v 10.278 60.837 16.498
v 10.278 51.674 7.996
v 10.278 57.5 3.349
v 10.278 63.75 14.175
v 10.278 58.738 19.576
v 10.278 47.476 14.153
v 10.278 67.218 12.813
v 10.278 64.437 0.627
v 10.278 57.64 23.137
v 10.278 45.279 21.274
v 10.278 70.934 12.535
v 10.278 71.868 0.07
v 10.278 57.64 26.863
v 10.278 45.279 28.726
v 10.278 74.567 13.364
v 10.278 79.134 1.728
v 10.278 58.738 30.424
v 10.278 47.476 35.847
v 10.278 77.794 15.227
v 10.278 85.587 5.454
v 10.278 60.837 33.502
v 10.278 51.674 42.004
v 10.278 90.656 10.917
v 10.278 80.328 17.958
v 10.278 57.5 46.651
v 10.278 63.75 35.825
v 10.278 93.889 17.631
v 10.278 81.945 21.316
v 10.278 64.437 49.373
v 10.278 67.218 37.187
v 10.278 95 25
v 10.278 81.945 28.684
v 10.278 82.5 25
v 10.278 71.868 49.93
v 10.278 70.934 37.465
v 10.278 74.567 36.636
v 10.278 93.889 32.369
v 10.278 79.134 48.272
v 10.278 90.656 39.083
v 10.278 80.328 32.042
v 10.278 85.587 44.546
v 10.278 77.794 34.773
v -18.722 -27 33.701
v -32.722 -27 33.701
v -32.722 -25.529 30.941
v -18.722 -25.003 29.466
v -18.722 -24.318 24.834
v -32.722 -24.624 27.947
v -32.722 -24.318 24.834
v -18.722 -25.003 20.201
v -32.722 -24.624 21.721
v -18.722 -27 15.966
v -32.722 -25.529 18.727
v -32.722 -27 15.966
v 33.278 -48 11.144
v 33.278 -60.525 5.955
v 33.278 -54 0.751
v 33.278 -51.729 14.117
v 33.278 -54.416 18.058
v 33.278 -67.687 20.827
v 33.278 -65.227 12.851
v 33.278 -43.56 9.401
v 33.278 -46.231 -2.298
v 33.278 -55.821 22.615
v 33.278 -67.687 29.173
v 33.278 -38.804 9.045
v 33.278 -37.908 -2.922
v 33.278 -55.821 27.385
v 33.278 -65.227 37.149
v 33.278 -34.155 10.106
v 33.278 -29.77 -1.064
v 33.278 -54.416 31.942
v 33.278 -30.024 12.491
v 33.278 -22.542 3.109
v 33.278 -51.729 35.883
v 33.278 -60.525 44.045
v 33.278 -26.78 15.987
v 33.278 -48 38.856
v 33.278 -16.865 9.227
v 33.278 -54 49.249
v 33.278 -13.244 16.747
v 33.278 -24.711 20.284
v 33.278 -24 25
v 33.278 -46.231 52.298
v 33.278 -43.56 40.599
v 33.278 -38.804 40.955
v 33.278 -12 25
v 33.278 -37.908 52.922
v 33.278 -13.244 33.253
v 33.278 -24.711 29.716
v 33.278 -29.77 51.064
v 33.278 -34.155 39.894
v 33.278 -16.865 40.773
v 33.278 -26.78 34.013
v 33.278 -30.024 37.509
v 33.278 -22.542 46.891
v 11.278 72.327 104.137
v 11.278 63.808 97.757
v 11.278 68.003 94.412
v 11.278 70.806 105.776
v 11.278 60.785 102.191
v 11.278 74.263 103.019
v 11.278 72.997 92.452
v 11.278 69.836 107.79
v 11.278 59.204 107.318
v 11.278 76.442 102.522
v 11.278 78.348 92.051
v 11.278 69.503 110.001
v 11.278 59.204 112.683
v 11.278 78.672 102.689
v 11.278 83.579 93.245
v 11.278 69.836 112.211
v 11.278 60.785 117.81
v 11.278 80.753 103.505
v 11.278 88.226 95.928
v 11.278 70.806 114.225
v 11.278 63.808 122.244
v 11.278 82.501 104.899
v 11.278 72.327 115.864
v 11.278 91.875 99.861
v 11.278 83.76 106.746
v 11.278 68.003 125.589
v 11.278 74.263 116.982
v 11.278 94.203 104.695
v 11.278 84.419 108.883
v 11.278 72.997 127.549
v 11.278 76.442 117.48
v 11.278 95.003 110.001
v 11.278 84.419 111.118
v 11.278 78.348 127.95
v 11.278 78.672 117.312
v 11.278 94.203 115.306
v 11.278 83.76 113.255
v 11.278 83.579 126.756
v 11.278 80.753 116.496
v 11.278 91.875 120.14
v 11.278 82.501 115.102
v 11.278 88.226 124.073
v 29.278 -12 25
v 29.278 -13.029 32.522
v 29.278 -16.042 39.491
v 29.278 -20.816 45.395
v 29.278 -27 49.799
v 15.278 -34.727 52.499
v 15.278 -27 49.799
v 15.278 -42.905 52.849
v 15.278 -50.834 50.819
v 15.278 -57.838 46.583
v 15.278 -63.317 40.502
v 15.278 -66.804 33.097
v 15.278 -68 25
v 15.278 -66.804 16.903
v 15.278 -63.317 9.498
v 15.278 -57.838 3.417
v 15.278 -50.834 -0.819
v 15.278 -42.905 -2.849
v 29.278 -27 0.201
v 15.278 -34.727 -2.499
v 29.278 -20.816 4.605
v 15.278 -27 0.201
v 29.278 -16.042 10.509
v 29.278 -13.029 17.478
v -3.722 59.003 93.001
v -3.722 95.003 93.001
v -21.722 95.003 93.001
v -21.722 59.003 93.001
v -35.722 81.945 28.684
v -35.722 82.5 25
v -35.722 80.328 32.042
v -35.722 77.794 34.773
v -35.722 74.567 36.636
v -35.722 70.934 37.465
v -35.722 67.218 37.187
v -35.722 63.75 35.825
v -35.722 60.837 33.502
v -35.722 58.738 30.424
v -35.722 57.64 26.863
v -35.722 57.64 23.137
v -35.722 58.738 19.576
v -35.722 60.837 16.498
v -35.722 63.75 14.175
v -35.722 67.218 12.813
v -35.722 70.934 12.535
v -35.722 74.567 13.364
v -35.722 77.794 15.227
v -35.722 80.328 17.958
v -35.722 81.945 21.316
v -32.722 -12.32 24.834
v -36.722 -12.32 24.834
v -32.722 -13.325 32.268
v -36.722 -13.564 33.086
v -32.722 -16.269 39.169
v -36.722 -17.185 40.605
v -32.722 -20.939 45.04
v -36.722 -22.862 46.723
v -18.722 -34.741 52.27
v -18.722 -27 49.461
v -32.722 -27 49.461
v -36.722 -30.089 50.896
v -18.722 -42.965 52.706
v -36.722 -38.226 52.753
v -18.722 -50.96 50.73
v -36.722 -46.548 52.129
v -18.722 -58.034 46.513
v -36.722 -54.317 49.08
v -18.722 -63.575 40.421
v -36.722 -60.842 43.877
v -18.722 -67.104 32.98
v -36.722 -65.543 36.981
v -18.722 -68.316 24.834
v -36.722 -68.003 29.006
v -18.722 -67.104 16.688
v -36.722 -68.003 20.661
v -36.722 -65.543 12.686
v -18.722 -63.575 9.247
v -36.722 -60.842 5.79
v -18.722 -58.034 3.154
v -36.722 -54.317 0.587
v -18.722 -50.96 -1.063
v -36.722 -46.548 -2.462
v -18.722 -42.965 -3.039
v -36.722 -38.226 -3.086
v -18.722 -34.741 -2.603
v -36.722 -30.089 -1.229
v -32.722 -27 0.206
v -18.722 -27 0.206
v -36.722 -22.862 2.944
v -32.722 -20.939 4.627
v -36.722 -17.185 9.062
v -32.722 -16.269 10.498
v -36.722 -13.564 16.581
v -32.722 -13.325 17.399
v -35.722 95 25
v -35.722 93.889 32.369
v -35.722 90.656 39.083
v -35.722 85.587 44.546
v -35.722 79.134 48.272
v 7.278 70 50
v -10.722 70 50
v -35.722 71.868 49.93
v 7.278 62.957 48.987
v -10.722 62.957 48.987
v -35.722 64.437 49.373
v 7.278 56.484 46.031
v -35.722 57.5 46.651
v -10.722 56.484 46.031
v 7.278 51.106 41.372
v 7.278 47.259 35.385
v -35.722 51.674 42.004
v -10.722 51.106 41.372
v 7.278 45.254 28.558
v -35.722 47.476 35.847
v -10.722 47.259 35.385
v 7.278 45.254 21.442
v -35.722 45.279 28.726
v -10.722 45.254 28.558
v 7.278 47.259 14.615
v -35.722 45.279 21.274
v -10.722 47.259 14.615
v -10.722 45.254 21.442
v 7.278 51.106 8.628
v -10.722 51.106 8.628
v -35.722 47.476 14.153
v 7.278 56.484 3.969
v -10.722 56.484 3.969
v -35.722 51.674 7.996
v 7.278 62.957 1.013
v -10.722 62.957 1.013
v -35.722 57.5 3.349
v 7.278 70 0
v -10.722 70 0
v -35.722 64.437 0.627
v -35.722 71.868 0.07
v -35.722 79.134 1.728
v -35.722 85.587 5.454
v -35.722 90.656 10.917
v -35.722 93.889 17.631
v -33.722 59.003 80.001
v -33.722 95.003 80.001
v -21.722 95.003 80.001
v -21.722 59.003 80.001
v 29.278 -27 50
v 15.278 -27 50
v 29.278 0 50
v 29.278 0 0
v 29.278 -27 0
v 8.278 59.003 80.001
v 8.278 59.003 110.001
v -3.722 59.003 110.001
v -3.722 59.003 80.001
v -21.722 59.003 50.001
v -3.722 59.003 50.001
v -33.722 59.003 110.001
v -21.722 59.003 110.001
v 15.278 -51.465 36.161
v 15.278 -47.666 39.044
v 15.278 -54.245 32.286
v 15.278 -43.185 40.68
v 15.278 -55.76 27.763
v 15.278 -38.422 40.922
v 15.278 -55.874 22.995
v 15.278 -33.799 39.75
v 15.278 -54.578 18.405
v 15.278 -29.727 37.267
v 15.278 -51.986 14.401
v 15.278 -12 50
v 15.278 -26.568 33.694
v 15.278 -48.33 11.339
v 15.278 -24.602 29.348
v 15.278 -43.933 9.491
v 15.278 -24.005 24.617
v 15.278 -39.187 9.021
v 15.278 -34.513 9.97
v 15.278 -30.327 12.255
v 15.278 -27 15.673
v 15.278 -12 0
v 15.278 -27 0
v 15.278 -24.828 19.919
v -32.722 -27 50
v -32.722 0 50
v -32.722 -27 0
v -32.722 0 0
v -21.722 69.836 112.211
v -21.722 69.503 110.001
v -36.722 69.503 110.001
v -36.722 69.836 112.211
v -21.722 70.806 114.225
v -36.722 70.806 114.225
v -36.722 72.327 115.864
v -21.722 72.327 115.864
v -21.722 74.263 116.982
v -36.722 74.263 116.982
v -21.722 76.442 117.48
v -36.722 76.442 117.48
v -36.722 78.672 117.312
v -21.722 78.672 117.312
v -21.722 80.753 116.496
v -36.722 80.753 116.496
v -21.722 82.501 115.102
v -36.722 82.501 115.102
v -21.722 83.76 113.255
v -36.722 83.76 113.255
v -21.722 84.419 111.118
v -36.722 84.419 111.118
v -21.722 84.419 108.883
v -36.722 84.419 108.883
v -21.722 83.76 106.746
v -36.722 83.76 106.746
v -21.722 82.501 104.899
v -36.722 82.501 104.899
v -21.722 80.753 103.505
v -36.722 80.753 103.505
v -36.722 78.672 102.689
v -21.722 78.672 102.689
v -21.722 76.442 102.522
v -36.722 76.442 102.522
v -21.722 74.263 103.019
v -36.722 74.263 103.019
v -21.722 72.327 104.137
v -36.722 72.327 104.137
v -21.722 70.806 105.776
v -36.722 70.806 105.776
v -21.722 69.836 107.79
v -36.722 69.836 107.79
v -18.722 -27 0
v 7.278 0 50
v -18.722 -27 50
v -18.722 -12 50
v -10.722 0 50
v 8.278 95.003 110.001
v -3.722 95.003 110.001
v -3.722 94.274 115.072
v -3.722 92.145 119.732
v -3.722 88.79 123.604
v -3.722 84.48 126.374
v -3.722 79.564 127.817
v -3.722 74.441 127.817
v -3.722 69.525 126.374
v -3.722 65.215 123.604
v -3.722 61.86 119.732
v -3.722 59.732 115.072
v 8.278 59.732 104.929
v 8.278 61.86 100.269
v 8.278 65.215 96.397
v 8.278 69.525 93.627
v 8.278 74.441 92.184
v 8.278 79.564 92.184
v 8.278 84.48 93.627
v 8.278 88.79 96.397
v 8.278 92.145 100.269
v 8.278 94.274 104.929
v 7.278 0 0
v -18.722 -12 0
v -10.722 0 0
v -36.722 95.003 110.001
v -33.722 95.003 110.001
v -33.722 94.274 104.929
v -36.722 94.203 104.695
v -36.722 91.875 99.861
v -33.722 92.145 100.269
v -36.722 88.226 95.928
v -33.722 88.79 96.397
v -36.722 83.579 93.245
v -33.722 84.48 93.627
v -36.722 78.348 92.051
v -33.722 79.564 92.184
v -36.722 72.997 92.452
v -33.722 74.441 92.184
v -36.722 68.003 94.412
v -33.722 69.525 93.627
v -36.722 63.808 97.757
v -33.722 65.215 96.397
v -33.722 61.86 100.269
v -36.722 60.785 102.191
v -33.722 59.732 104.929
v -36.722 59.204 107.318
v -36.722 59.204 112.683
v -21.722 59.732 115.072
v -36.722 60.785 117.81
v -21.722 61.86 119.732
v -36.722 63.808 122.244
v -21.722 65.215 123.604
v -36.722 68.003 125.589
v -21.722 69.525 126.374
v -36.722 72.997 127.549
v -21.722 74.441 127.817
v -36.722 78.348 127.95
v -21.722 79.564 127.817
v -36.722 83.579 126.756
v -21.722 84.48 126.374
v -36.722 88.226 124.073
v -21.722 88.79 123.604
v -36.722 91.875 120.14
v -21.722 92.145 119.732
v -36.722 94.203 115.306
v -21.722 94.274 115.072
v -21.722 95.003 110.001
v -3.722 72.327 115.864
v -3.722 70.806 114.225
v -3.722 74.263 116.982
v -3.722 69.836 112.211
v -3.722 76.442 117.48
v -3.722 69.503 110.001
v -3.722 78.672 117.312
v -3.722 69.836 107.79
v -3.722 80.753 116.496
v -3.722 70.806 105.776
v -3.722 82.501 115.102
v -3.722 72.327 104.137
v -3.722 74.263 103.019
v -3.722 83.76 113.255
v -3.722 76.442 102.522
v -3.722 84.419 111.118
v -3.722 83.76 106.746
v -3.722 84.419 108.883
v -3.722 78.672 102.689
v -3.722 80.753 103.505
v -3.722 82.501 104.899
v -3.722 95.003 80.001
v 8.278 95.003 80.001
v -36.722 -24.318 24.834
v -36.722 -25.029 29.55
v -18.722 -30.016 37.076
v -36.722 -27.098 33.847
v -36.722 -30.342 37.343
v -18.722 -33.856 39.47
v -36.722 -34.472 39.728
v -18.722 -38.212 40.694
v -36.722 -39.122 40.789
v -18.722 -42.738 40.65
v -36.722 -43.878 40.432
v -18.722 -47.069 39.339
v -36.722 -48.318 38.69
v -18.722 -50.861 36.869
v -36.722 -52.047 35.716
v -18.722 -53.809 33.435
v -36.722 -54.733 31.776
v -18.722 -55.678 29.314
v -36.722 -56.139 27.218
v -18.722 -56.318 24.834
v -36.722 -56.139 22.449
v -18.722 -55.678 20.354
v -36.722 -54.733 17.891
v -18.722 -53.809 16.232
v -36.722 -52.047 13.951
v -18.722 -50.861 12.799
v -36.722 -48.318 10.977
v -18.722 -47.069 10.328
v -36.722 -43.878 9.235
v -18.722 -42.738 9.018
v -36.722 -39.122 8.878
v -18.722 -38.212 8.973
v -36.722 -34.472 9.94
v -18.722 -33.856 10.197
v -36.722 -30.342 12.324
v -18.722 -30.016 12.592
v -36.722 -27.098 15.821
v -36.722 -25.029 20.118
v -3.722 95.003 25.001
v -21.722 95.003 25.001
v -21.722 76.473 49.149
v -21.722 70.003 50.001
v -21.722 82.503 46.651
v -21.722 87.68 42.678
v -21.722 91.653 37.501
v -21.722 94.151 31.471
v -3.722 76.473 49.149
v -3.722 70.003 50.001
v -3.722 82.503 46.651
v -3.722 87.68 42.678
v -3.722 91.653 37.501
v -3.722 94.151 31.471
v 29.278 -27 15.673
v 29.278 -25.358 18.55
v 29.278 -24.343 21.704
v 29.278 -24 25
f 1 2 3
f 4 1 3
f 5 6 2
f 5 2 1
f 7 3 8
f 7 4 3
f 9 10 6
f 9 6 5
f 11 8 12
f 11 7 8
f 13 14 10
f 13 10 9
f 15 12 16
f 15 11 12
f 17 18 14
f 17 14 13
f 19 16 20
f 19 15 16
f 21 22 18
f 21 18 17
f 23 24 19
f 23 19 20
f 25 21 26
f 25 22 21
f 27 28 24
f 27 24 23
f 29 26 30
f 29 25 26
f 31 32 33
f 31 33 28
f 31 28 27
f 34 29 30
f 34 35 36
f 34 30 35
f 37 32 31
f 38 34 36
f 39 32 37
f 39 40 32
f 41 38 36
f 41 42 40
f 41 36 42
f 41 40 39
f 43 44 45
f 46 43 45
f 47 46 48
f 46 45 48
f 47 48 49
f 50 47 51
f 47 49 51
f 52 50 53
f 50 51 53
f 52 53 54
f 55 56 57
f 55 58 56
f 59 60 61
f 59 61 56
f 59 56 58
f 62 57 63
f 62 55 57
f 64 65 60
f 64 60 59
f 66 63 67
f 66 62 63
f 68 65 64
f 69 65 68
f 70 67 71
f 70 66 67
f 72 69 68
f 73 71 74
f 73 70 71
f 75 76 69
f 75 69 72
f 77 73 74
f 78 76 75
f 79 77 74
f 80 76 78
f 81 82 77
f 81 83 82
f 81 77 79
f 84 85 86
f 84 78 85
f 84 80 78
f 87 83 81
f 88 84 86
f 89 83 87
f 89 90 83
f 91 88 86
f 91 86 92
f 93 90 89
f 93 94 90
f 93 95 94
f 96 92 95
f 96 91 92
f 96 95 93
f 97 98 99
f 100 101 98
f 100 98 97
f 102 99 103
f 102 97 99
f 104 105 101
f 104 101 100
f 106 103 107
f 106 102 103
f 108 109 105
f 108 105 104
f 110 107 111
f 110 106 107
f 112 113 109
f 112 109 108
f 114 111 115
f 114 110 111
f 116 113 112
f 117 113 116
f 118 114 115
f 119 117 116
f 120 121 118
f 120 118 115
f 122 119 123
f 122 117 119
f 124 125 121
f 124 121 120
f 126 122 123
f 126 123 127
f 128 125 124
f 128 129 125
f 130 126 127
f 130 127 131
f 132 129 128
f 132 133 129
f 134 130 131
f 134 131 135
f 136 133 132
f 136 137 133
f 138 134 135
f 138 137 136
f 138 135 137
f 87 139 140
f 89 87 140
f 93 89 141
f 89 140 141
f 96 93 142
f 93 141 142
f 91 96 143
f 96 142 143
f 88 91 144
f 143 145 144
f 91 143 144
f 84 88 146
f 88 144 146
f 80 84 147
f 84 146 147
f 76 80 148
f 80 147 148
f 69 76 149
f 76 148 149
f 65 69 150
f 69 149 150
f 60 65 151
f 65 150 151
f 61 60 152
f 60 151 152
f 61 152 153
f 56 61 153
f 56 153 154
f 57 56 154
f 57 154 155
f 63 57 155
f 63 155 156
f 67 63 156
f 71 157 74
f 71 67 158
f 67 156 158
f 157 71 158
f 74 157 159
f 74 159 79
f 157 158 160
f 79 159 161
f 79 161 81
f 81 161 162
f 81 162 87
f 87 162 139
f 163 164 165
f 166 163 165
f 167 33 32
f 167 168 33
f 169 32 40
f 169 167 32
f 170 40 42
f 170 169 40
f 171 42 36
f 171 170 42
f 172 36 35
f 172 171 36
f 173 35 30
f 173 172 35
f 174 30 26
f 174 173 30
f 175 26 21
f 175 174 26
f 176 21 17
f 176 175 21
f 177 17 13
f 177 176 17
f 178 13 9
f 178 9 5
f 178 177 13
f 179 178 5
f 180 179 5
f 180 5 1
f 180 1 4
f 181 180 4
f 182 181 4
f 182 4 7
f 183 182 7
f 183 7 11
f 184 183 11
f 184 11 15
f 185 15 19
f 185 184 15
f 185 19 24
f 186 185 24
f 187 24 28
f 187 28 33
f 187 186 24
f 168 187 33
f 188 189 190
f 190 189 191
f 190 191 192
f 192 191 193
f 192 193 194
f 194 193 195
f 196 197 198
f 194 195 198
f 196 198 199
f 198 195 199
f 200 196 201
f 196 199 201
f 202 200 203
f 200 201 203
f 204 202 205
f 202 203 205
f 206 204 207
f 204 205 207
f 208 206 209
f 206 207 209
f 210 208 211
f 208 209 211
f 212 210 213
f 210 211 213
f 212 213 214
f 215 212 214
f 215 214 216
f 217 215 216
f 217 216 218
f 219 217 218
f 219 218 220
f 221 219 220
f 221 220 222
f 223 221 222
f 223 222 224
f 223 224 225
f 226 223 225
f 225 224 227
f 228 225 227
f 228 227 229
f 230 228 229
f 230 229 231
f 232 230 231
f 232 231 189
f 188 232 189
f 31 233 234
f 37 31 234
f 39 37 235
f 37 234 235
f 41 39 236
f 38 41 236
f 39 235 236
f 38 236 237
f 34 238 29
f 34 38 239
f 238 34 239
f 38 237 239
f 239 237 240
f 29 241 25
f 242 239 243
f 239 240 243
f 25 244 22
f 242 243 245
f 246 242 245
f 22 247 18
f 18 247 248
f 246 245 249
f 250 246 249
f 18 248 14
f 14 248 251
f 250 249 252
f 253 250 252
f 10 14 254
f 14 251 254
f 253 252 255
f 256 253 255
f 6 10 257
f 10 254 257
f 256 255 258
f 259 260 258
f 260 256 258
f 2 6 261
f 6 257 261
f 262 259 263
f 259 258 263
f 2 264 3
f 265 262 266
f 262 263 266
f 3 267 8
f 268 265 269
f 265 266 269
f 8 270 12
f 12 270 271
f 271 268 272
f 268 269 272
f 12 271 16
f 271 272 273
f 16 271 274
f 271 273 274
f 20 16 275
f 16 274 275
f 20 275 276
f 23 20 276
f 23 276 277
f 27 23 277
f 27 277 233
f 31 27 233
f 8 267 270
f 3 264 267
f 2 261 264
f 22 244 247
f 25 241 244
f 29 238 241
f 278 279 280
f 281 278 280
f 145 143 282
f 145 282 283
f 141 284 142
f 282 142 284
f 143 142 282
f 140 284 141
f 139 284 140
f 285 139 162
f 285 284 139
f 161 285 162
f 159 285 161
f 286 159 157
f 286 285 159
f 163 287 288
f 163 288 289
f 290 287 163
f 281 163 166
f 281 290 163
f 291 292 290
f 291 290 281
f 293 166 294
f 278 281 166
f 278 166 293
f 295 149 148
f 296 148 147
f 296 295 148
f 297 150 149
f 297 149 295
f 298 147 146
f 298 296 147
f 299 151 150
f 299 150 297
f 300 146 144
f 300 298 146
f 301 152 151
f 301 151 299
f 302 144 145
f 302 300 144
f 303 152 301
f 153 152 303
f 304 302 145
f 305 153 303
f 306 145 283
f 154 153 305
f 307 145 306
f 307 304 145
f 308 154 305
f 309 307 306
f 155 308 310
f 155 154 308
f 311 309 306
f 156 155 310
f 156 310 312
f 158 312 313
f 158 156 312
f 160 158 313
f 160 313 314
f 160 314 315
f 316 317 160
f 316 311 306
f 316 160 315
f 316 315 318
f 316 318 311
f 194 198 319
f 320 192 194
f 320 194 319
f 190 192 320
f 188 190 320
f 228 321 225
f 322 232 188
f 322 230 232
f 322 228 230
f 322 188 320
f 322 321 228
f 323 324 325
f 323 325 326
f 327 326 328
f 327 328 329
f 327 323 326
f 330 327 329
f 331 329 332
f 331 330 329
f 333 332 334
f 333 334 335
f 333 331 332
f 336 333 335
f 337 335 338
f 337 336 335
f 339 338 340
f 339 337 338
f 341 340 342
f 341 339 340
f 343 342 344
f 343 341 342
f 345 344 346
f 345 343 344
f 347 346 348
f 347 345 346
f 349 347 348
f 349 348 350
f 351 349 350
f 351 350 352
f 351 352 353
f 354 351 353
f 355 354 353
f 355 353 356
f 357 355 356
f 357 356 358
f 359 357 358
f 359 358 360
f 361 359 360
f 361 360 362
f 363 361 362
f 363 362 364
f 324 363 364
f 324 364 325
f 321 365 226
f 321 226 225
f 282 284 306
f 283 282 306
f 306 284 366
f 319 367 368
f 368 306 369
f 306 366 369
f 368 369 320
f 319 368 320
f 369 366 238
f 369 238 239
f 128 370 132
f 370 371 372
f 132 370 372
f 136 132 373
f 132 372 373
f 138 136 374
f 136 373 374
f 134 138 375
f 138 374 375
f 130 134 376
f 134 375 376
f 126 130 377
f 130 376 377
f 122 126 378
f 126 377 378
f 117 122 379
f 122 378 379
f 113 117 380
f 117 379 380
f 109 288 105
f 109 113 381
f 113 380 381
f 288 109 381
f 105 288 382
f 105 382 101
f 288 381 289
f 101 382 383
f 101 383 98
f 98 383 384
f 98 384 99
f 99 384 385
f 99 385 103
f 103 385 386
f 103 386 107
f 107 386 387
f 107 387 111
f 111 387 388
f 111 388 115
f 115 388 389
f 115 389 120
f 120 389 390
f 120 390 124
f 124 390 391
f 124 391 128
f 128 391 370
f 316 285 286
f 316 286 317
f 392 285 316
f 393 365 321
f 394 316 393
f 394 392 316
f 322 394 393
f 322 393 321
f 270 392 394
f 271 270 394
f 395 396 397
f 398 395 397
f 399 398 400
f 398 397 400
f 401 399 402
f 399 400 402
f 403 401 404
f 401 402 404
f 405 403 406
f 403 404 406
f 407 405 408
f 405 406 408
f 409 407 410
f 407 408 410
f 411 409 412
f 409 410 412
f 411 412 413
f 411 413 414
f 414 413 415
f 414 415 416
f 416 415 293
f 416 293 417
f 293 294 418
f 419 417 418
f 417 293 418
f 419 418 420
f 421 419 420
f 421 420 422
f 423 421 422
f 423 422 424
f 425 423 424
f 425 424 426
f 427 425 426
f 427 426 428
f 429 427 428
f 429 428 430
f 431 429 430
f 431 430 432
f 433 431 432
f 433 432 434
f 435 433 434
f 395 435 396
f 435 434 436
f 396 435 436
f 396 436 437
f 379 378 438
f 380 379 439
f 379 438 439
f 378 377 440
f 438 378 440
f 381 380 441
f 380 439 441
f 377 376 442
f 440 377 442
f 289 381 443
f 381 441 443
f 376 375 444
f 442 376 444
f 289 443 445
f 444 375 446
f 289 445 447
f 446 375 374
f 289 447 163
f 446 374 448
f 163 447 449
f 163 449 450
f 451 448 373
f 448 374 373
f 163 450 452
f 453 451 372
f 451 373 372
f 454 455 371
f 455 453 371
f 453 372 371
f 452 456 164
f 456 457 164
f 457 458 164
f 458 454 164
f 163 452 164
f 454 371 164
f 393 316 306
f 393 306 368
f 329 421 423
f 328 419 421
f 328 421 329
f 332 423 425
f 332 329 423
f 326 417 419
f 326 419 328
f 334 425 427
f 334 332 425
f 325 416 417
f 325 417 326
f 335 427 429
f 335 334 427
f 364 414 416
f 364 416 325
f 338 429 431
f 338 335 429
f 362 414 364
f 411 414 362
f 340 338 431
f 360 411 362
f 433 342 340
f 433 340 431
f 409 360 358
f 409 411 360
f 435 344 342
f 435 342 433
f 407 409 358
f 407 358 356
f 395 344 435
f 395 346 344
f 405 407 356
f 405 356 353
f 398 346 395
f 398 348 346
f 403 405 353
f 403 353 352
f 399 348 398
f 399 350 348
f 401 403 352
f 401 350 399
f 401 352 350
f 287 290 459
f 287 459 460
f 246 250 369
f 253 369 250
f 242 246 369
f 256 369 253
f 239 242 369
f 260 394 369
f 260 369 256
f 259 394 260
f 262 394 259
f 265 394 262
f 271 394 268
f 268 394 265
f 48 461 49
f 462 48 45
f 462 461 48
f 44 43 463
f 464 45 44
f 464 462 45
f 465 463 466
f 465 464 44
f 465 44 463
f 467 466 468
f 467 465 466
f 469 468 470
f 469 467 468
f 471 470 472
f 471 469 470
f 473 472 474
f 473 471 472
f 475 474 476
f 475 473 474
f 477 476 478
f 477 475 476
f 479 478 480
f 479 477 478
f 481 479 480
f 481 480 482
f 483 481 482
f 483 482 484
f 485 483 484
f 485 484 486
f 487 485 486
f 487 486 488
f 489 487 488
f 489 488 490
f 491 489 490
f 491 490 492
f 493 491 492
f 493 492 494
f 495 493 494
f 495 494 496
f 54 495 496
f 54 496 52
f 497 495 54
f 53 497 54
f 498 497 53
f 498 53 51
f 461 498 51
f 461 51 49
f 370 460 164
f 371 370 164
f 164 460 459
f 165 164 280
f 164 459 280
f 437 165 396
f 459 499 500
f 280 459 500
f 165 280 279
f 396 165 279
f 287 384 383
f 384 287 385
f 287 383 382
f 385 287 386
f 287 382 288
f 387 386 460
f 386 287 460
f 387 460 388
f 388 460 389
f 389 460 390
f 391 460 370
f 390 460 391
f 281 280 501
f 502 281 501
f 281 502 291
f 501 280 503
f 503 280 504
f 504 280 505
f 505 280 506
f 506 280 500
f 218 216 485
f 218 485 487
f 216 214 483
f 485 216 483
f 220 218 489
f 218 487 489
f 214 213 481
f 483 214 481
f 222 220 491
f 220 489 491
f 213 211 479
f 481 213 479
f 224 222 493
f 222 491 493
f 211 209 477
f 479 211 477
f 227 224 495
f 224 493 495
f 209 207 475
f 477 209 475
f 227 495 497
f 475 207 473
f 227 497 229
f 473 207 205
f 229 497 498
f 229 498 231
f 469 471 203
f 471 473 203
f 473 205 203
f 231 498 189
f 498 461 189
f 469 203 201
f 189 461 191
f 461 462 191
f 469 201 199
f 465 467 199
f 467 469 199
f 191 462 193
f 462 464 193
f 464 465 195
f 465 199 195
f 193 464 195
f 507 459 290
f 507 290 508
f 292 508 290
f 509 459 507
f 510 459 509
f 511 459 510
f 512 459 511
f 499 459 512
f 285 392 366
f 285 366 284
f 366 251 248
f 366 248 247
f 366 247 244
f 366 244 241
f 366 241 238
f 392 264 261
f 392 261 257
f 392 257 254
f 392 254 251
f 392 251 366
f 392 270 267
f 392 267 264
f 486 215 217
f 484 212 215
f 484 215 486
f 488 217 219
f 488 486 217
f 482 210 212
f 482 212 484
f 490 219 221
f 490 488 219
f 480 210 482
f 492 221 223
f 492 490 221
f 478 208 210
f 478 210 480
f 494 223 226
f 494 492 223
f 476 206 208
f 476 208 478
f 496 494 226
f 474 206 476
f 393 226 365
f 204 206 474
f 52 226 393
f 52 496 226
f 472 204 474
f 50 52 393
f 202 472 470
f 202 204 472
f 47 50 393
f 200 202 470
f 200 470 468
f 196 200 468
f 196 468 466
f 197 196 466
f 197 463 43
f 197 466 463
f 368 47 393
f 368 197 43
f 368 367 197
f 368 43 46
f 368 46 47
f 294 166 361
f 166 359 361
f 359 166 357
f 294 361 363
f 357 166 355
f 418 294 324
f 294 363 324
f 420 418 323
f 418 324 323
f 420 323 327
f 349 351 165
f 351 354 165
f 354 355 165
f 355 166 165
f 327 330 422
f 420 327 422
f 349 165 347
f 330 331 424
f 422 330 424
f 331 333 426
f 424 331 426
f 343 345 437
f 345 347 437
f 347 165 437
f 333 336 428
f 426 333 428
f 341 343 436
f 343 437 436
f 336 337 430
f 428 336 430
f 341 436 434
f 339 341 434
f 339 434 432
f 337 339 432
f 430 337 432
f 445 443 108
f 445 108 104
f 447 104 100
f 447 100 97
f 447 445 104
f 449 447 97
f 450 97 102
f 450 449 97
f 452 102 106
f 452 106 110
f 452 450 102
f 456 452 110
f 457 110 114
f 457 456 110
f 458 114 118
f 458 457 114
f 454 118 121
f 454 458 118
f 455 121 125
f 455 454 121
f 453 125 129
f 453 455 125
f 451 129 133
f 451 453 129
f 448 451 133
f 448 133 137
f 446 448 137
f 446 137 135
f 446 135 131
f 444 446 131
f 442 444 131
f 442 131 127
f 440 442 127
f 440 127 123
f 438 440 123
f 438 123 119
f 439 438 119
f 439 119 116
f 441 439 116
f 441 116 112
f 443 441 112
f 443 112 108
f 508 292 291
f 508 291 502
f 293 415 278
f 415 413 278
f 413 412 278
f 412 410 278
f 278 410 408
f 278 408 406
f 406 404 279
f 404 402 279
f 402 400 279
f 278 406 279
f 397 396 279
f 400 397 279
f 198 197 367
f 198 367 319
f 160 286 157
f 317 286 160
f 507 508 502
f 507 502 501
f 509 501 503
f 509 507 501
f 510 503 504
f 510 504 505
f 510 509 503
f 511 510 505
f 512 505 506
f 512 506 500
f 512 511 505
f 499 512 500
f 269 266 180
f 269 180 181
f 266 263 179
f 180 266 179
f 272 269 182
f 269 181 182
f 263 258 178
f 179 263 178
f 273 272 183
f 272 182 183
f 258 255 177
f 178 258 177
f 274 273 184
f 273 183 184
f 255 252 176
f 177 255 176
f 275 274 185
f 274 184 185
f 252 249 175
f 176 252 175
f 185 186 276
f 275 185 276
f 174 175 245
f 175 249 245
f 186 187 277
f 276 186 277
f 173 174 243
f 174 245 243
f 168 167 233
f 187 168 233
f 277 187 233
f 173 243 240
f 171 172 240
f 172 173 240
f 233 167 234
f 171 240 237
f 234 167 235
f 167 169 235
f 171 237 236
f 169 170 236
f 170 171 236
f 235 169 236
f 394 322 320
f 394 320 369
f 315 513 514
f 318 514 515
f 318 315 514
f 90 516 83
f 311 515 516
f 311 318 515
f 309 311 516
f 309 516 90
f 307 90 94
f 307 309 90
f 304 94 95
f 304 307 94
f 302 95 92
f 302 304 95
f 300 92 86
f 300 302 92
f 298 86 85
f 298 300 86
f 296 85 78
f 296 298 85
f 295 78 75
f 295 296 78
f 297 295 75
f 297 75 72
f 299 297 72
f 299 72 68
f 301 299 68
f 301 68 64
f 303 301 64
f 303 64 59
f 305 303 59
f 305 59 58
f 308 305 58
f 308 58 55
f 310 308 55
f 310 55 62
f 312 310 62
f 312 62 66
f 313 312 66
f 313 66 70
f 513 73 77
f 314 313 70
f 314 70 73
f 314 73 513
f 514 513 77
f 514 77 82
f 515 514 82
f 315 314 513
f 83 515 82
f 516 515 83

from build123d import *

# Parameters (mm, degrees)
BOSS_EXTRUDE1_DEPTH       = 50
BOSS_EXTRUDE7_START       = 15.277897686
BOSS_EXTRUDE7_OUTLINE_R   = 28
BOSS_EXTRUDE7_OUTLINE_R_2 = 16
BOSS_EXTRUDE7_DEPTH       = 18
CUT_EXTRUDE1_START        = -40
CUT_EXTRUDE1_DEPTH        = 40
BOSS_EXTRUDE8_START       = -36.722102314
BOSS_EXTRUDE8_OUTLINE_R   = 27.997706522
BOSS_EXTRUDE8_OUTLINE_R_2 = 16
BOSS_EXTRUDE8_DEPTH       = 18
CUT_EXTRUDE2_DEPTH        = 20
BOSS_EXTRUDE9_START       = -35.722102314
BOSS_EXTRUDE9_OUTLINE_R   = 25
BOSS_EXTRUDE9_OUTLINE_R_2 = 12.5
BOSS_EXTRUDE9_DEPTH       = 46
CUT_EXTRUDE3_START        = -18
CUT_EXTRUDE3_DEPTH        = 18
BOSS_EXTRUDE10_DEPTH      = 18
BOSS_EXTRUDE11_DEPTH      = 36
BOSS_EXTRUDE12_DEPTH      = 3
BOSS_EXTRUDE12_DEPTH_BACK = 11.999999999999996
SKETCH11_R                = 17.999999999999993
SKETCH11_R_2              = 7.499999999999997
BOSS_EXTRUDE13_DEPTH      = 3
BOSS_EXTRUDE13_DEPTH_BACK = 11.999999999999996
SKETCH12_R                = 18.000000000000018
SKETCH12_R_2              = 7.500000000000014
CUT_EXTRUDE6_DEPTH        = 107.00000000000003


# Read off the part's stored shape, not the designer's step: Boss-Extrude7, Boss-Extrude8, Boss-Extrude9
with BuildPart() as part:
    # Sketch1 → Boss-Extrude1 (new body)
    with BuildSketch(Plane.XY):
        Polygon((-10.722102313940692, 70), (7.2778976860593065, 70), (7.277897686059314, 0), (29.277897686059326, 0), (29.277897686059333, -27), (15.27789768605932, -27), (15.277897686059319, -12), (-18.722102313940685, -12), (-18.722102313940685, -27), (-32.72210231394068, -27), (-32.72210231394068, 0), (-10.722102313940685, 0), align=None)
    extrude(amount=BOSS_EXTRUDE1_DEPTH)

    # Boss-Extrude7 outline → Boss-Extrude7 (add)
    with BuildSketch(Plane.YZ.offset(BOSS_EXTRUDE7_START)):
        with Locations((-40, 25)):
            Circle(BOSS_EXTRUDE7_OUTLINE_R)
        with Locations((-40, 25)):
            Circle(BOSS_EXTRUDE7_OUTLINE_R_2, mode=Mode.SUBTRACT)
    extrude(amount=BOSS_EXTRUDE7_DEPTH)

    # Sketch5 → Cut-Extrude1 (cut)
    with BuildSketch(Plane(origin=(29.277897686059326, 7.52e-15, 0), x_dir=(0, 0, -1), z_dir=(1, 1.3e-16, 0)).offset(CUT_EXTRUDE1_START)):
        with BuildLine():
            Line((-34.32737905308882, -27.000000000000007), (-15.672620946911175, -27.000000000000007))
            ThreePointArc((-15.672620946911175, -27.000000000000007), (-24.999999999999996, -24), (-34.32737905308882, -27.000000000000007))
        make_face()
    extrude(amount=CUT_EXTRUDE1_DEPTH, mode=Mode.SUBTRACT)

    # Boss-Extrude8 outline → Boss-Extrude8 (add)
    with BuildSketch(Plane.YZ.offset(BOSS_EXTRUDE8_START)):
        with Locations((-40.317870429, 24.833627259)):
            Circle(BOSS_EXTRUDE8_OUTLINE_R)
        with Locations((-40.317870429, 24.833627259)):
            Circle(BOSS_EXTRUDE8_OUTLINE_R_2, mode=Mode.SUBTRACT)
    extrude(amount=BOSS_EXTRUDE8_DEPTH)

    # Sketch7 → Cut-Extrude2 (cut)
    with BuildSketch(Plane.ZY.offset(32.72210231394068)):
        with BuildLine():
            Line((15.966027400668322, -27.000000000000004), (33.701227116351625, -27))
            ThreePointArc((33.701227116351625, -27), (24.833627258509974, -24.317870428908922), (15.966027400668322, -27.000000000000004))
        make_face()
    extrude(amount=-CUT_EXTRUDE2_DEPTH, mode=Mode.SUBTRACT)

    # Boss-Extrude9 outline → Boss-Extrude9 (add)
    with BuildSketch(Plane.YZ.offset(BOSS_EXTRUDE9_START)):
        with Locations((70, 25)):
            Circle(BOSS_EXTRUDE9_OUTLINE_R)
        with Locations((70, 25)):
            Circle(BOSS_EXTRUDE9_OUTLINE_R_2, mode=Mode.SUBTRACT)
    extrude(amount=BOSS_EXTRUDE9_DEPTH)

    # Sketch8 → Cut-Extrude3 (cut)
    with BuildSketch(Plane(origin=(7.277897686059314, 7.2e-16, 0), x_dir=(0, 0, -1), z_dir=(1, 1.1e-16, 0)).offset(CUT_EXTRUDE3_START)):
        with BuildLine():
            Line((-37.5, 70), (-12.500000000000004, 70))
            ThreePointArc((-12.500000000000004, 70), (-25, 57.5), (-37.5, 70))
        make_face()
    extrude(amount=CUT_EXTRUDE3_DEPTH, mode=Mode.SUBTRACT)


with BuildPart() as body_2:
    # 3DSketch6 → Boss-Extrude10 (new body)
    with BuildSketch(Plane(origin=(-3.722102313940688, 59.00273717207905, 50.00053283671438), x_dir=(0, 0.7682212795973759, 0.6401843996644798), z_dir=(-1, -1.2e-16, 0))):
        with BuildLine():
            Line((0, 0), (8.450434075571126, 7.042028396309271))
            ThreePointArc((8.450434075571126, 7.042028396309271), (17.343154245651732, 23.984166735180708), (11.651356073893528, 42.25217037785568))
            Line((11.651356073893528, 42.25217037785568), (46.86149805543992, -3.47e-15))
            Line((46.86149805543992, -3.47e-15), (19.205531989934393, -23.046638387921277))
            Line((19.205531989934393, -23.046638387921277), (0, 0))
        make_face()
    extrude(amount=BOSS_EXTRUDE10_DEPTH)

    # 3DSketch7 → Boss-Extrude11 (add)
    with BuildSketch(Plane(origin=(8.27789768605931, 95.00273717207905, 80.00053283671437), x_dir=(-0.8137334712067349, 0, 0.5812381937190965), z_dir=(0, -1, 0))):
        Polygon((0, 0), (17.437145811572893, -24.412004136202047), (27.201947466053713, -17.43714581157289), (17.32089817282907, -3.6036768010583953), (31.9681006545503, 6.858610685885341), (41.84914994777495, -6.974858324629154), (51.61395160225576, 0), (34.17680579068287, 24.412004136202057), align=None)
    extrude(amount=BOSS_EXTRUDE11_DEPTH)

    # Sketch11 → Boss-Extrude12 (add, two sides: drawn at the far end of the back side and taken through both)
    with BuildSketch(Plane(origin=(8.27789768605931, 0, 0), x_dir=(0, 0, -1), z_dir=(1, 0, 0)).offset(-BOSS_EXTRUDE12_DEPTH_BACK)):
        with Locations(Location((-110.00053283671436, 77.00273717207905, 0), (0, 0, 90))):
            Circle(SKETCH11_R)
        with Locations(Location((-110.00053283671436, 77.00273717207905, 0), (0, 0, 270))):
            Circle(SKETCH11_R_2, mode=Mode.SUBTRACT)
    extrude(amount=BOSS_EXTRUDE12_DEPTH + BOSS_EXTRUDE12_DEPTH_BACK)

    # Sketch12 → Boss-Extrude13 (add, two sides: drawn at the far end of the back side and taken through both)
    with BuildSketch(Plane.ZY.offset(33.72210231394072).offset(-BOSS_EXTRUDE13_DEPTH_BACK)):
        with Locations(Location((110.00053283671434, 77.00273717207905, 0), (0, 0, 90))):
            Circle(SKETCH12_R)
        with Locations(Location((110.00053283671434, 77.00273717207905, 0), (0, 0, 270))):
            Circle(SKETCH12_R_2, mode=Mode.SUBTRACT)
    extrude(amount=BOSS_EXTRUDE13_DEPTH + BOSS_EXTRUDE13_DEPTH_BACK)

    # Sketch13 → Cut-Extrude6 (cut)
    with BuildSketch(Plane(origin=(8.27789768605931, 0, 0), x_dir=(0, 0, -1), z_dir=(1, 0, 0))):
        with BuildLine():
            Line((-110.00053283671436, 84.50273717207904), (-110.00053283671437, 69.50273717207905))
            ThreePointArc((-110.00053283671437, 69.50273717207905), (-102.50053283671437, 77.00273717207905), (-110.00053283671436, 84.50273717207904))
        make_face()
    extrude(amount=-CUT_EXTRUDE6_DEPTH, mode=Mode.SUBTRACT)


solid = Compound([part.part, body_2.part])
